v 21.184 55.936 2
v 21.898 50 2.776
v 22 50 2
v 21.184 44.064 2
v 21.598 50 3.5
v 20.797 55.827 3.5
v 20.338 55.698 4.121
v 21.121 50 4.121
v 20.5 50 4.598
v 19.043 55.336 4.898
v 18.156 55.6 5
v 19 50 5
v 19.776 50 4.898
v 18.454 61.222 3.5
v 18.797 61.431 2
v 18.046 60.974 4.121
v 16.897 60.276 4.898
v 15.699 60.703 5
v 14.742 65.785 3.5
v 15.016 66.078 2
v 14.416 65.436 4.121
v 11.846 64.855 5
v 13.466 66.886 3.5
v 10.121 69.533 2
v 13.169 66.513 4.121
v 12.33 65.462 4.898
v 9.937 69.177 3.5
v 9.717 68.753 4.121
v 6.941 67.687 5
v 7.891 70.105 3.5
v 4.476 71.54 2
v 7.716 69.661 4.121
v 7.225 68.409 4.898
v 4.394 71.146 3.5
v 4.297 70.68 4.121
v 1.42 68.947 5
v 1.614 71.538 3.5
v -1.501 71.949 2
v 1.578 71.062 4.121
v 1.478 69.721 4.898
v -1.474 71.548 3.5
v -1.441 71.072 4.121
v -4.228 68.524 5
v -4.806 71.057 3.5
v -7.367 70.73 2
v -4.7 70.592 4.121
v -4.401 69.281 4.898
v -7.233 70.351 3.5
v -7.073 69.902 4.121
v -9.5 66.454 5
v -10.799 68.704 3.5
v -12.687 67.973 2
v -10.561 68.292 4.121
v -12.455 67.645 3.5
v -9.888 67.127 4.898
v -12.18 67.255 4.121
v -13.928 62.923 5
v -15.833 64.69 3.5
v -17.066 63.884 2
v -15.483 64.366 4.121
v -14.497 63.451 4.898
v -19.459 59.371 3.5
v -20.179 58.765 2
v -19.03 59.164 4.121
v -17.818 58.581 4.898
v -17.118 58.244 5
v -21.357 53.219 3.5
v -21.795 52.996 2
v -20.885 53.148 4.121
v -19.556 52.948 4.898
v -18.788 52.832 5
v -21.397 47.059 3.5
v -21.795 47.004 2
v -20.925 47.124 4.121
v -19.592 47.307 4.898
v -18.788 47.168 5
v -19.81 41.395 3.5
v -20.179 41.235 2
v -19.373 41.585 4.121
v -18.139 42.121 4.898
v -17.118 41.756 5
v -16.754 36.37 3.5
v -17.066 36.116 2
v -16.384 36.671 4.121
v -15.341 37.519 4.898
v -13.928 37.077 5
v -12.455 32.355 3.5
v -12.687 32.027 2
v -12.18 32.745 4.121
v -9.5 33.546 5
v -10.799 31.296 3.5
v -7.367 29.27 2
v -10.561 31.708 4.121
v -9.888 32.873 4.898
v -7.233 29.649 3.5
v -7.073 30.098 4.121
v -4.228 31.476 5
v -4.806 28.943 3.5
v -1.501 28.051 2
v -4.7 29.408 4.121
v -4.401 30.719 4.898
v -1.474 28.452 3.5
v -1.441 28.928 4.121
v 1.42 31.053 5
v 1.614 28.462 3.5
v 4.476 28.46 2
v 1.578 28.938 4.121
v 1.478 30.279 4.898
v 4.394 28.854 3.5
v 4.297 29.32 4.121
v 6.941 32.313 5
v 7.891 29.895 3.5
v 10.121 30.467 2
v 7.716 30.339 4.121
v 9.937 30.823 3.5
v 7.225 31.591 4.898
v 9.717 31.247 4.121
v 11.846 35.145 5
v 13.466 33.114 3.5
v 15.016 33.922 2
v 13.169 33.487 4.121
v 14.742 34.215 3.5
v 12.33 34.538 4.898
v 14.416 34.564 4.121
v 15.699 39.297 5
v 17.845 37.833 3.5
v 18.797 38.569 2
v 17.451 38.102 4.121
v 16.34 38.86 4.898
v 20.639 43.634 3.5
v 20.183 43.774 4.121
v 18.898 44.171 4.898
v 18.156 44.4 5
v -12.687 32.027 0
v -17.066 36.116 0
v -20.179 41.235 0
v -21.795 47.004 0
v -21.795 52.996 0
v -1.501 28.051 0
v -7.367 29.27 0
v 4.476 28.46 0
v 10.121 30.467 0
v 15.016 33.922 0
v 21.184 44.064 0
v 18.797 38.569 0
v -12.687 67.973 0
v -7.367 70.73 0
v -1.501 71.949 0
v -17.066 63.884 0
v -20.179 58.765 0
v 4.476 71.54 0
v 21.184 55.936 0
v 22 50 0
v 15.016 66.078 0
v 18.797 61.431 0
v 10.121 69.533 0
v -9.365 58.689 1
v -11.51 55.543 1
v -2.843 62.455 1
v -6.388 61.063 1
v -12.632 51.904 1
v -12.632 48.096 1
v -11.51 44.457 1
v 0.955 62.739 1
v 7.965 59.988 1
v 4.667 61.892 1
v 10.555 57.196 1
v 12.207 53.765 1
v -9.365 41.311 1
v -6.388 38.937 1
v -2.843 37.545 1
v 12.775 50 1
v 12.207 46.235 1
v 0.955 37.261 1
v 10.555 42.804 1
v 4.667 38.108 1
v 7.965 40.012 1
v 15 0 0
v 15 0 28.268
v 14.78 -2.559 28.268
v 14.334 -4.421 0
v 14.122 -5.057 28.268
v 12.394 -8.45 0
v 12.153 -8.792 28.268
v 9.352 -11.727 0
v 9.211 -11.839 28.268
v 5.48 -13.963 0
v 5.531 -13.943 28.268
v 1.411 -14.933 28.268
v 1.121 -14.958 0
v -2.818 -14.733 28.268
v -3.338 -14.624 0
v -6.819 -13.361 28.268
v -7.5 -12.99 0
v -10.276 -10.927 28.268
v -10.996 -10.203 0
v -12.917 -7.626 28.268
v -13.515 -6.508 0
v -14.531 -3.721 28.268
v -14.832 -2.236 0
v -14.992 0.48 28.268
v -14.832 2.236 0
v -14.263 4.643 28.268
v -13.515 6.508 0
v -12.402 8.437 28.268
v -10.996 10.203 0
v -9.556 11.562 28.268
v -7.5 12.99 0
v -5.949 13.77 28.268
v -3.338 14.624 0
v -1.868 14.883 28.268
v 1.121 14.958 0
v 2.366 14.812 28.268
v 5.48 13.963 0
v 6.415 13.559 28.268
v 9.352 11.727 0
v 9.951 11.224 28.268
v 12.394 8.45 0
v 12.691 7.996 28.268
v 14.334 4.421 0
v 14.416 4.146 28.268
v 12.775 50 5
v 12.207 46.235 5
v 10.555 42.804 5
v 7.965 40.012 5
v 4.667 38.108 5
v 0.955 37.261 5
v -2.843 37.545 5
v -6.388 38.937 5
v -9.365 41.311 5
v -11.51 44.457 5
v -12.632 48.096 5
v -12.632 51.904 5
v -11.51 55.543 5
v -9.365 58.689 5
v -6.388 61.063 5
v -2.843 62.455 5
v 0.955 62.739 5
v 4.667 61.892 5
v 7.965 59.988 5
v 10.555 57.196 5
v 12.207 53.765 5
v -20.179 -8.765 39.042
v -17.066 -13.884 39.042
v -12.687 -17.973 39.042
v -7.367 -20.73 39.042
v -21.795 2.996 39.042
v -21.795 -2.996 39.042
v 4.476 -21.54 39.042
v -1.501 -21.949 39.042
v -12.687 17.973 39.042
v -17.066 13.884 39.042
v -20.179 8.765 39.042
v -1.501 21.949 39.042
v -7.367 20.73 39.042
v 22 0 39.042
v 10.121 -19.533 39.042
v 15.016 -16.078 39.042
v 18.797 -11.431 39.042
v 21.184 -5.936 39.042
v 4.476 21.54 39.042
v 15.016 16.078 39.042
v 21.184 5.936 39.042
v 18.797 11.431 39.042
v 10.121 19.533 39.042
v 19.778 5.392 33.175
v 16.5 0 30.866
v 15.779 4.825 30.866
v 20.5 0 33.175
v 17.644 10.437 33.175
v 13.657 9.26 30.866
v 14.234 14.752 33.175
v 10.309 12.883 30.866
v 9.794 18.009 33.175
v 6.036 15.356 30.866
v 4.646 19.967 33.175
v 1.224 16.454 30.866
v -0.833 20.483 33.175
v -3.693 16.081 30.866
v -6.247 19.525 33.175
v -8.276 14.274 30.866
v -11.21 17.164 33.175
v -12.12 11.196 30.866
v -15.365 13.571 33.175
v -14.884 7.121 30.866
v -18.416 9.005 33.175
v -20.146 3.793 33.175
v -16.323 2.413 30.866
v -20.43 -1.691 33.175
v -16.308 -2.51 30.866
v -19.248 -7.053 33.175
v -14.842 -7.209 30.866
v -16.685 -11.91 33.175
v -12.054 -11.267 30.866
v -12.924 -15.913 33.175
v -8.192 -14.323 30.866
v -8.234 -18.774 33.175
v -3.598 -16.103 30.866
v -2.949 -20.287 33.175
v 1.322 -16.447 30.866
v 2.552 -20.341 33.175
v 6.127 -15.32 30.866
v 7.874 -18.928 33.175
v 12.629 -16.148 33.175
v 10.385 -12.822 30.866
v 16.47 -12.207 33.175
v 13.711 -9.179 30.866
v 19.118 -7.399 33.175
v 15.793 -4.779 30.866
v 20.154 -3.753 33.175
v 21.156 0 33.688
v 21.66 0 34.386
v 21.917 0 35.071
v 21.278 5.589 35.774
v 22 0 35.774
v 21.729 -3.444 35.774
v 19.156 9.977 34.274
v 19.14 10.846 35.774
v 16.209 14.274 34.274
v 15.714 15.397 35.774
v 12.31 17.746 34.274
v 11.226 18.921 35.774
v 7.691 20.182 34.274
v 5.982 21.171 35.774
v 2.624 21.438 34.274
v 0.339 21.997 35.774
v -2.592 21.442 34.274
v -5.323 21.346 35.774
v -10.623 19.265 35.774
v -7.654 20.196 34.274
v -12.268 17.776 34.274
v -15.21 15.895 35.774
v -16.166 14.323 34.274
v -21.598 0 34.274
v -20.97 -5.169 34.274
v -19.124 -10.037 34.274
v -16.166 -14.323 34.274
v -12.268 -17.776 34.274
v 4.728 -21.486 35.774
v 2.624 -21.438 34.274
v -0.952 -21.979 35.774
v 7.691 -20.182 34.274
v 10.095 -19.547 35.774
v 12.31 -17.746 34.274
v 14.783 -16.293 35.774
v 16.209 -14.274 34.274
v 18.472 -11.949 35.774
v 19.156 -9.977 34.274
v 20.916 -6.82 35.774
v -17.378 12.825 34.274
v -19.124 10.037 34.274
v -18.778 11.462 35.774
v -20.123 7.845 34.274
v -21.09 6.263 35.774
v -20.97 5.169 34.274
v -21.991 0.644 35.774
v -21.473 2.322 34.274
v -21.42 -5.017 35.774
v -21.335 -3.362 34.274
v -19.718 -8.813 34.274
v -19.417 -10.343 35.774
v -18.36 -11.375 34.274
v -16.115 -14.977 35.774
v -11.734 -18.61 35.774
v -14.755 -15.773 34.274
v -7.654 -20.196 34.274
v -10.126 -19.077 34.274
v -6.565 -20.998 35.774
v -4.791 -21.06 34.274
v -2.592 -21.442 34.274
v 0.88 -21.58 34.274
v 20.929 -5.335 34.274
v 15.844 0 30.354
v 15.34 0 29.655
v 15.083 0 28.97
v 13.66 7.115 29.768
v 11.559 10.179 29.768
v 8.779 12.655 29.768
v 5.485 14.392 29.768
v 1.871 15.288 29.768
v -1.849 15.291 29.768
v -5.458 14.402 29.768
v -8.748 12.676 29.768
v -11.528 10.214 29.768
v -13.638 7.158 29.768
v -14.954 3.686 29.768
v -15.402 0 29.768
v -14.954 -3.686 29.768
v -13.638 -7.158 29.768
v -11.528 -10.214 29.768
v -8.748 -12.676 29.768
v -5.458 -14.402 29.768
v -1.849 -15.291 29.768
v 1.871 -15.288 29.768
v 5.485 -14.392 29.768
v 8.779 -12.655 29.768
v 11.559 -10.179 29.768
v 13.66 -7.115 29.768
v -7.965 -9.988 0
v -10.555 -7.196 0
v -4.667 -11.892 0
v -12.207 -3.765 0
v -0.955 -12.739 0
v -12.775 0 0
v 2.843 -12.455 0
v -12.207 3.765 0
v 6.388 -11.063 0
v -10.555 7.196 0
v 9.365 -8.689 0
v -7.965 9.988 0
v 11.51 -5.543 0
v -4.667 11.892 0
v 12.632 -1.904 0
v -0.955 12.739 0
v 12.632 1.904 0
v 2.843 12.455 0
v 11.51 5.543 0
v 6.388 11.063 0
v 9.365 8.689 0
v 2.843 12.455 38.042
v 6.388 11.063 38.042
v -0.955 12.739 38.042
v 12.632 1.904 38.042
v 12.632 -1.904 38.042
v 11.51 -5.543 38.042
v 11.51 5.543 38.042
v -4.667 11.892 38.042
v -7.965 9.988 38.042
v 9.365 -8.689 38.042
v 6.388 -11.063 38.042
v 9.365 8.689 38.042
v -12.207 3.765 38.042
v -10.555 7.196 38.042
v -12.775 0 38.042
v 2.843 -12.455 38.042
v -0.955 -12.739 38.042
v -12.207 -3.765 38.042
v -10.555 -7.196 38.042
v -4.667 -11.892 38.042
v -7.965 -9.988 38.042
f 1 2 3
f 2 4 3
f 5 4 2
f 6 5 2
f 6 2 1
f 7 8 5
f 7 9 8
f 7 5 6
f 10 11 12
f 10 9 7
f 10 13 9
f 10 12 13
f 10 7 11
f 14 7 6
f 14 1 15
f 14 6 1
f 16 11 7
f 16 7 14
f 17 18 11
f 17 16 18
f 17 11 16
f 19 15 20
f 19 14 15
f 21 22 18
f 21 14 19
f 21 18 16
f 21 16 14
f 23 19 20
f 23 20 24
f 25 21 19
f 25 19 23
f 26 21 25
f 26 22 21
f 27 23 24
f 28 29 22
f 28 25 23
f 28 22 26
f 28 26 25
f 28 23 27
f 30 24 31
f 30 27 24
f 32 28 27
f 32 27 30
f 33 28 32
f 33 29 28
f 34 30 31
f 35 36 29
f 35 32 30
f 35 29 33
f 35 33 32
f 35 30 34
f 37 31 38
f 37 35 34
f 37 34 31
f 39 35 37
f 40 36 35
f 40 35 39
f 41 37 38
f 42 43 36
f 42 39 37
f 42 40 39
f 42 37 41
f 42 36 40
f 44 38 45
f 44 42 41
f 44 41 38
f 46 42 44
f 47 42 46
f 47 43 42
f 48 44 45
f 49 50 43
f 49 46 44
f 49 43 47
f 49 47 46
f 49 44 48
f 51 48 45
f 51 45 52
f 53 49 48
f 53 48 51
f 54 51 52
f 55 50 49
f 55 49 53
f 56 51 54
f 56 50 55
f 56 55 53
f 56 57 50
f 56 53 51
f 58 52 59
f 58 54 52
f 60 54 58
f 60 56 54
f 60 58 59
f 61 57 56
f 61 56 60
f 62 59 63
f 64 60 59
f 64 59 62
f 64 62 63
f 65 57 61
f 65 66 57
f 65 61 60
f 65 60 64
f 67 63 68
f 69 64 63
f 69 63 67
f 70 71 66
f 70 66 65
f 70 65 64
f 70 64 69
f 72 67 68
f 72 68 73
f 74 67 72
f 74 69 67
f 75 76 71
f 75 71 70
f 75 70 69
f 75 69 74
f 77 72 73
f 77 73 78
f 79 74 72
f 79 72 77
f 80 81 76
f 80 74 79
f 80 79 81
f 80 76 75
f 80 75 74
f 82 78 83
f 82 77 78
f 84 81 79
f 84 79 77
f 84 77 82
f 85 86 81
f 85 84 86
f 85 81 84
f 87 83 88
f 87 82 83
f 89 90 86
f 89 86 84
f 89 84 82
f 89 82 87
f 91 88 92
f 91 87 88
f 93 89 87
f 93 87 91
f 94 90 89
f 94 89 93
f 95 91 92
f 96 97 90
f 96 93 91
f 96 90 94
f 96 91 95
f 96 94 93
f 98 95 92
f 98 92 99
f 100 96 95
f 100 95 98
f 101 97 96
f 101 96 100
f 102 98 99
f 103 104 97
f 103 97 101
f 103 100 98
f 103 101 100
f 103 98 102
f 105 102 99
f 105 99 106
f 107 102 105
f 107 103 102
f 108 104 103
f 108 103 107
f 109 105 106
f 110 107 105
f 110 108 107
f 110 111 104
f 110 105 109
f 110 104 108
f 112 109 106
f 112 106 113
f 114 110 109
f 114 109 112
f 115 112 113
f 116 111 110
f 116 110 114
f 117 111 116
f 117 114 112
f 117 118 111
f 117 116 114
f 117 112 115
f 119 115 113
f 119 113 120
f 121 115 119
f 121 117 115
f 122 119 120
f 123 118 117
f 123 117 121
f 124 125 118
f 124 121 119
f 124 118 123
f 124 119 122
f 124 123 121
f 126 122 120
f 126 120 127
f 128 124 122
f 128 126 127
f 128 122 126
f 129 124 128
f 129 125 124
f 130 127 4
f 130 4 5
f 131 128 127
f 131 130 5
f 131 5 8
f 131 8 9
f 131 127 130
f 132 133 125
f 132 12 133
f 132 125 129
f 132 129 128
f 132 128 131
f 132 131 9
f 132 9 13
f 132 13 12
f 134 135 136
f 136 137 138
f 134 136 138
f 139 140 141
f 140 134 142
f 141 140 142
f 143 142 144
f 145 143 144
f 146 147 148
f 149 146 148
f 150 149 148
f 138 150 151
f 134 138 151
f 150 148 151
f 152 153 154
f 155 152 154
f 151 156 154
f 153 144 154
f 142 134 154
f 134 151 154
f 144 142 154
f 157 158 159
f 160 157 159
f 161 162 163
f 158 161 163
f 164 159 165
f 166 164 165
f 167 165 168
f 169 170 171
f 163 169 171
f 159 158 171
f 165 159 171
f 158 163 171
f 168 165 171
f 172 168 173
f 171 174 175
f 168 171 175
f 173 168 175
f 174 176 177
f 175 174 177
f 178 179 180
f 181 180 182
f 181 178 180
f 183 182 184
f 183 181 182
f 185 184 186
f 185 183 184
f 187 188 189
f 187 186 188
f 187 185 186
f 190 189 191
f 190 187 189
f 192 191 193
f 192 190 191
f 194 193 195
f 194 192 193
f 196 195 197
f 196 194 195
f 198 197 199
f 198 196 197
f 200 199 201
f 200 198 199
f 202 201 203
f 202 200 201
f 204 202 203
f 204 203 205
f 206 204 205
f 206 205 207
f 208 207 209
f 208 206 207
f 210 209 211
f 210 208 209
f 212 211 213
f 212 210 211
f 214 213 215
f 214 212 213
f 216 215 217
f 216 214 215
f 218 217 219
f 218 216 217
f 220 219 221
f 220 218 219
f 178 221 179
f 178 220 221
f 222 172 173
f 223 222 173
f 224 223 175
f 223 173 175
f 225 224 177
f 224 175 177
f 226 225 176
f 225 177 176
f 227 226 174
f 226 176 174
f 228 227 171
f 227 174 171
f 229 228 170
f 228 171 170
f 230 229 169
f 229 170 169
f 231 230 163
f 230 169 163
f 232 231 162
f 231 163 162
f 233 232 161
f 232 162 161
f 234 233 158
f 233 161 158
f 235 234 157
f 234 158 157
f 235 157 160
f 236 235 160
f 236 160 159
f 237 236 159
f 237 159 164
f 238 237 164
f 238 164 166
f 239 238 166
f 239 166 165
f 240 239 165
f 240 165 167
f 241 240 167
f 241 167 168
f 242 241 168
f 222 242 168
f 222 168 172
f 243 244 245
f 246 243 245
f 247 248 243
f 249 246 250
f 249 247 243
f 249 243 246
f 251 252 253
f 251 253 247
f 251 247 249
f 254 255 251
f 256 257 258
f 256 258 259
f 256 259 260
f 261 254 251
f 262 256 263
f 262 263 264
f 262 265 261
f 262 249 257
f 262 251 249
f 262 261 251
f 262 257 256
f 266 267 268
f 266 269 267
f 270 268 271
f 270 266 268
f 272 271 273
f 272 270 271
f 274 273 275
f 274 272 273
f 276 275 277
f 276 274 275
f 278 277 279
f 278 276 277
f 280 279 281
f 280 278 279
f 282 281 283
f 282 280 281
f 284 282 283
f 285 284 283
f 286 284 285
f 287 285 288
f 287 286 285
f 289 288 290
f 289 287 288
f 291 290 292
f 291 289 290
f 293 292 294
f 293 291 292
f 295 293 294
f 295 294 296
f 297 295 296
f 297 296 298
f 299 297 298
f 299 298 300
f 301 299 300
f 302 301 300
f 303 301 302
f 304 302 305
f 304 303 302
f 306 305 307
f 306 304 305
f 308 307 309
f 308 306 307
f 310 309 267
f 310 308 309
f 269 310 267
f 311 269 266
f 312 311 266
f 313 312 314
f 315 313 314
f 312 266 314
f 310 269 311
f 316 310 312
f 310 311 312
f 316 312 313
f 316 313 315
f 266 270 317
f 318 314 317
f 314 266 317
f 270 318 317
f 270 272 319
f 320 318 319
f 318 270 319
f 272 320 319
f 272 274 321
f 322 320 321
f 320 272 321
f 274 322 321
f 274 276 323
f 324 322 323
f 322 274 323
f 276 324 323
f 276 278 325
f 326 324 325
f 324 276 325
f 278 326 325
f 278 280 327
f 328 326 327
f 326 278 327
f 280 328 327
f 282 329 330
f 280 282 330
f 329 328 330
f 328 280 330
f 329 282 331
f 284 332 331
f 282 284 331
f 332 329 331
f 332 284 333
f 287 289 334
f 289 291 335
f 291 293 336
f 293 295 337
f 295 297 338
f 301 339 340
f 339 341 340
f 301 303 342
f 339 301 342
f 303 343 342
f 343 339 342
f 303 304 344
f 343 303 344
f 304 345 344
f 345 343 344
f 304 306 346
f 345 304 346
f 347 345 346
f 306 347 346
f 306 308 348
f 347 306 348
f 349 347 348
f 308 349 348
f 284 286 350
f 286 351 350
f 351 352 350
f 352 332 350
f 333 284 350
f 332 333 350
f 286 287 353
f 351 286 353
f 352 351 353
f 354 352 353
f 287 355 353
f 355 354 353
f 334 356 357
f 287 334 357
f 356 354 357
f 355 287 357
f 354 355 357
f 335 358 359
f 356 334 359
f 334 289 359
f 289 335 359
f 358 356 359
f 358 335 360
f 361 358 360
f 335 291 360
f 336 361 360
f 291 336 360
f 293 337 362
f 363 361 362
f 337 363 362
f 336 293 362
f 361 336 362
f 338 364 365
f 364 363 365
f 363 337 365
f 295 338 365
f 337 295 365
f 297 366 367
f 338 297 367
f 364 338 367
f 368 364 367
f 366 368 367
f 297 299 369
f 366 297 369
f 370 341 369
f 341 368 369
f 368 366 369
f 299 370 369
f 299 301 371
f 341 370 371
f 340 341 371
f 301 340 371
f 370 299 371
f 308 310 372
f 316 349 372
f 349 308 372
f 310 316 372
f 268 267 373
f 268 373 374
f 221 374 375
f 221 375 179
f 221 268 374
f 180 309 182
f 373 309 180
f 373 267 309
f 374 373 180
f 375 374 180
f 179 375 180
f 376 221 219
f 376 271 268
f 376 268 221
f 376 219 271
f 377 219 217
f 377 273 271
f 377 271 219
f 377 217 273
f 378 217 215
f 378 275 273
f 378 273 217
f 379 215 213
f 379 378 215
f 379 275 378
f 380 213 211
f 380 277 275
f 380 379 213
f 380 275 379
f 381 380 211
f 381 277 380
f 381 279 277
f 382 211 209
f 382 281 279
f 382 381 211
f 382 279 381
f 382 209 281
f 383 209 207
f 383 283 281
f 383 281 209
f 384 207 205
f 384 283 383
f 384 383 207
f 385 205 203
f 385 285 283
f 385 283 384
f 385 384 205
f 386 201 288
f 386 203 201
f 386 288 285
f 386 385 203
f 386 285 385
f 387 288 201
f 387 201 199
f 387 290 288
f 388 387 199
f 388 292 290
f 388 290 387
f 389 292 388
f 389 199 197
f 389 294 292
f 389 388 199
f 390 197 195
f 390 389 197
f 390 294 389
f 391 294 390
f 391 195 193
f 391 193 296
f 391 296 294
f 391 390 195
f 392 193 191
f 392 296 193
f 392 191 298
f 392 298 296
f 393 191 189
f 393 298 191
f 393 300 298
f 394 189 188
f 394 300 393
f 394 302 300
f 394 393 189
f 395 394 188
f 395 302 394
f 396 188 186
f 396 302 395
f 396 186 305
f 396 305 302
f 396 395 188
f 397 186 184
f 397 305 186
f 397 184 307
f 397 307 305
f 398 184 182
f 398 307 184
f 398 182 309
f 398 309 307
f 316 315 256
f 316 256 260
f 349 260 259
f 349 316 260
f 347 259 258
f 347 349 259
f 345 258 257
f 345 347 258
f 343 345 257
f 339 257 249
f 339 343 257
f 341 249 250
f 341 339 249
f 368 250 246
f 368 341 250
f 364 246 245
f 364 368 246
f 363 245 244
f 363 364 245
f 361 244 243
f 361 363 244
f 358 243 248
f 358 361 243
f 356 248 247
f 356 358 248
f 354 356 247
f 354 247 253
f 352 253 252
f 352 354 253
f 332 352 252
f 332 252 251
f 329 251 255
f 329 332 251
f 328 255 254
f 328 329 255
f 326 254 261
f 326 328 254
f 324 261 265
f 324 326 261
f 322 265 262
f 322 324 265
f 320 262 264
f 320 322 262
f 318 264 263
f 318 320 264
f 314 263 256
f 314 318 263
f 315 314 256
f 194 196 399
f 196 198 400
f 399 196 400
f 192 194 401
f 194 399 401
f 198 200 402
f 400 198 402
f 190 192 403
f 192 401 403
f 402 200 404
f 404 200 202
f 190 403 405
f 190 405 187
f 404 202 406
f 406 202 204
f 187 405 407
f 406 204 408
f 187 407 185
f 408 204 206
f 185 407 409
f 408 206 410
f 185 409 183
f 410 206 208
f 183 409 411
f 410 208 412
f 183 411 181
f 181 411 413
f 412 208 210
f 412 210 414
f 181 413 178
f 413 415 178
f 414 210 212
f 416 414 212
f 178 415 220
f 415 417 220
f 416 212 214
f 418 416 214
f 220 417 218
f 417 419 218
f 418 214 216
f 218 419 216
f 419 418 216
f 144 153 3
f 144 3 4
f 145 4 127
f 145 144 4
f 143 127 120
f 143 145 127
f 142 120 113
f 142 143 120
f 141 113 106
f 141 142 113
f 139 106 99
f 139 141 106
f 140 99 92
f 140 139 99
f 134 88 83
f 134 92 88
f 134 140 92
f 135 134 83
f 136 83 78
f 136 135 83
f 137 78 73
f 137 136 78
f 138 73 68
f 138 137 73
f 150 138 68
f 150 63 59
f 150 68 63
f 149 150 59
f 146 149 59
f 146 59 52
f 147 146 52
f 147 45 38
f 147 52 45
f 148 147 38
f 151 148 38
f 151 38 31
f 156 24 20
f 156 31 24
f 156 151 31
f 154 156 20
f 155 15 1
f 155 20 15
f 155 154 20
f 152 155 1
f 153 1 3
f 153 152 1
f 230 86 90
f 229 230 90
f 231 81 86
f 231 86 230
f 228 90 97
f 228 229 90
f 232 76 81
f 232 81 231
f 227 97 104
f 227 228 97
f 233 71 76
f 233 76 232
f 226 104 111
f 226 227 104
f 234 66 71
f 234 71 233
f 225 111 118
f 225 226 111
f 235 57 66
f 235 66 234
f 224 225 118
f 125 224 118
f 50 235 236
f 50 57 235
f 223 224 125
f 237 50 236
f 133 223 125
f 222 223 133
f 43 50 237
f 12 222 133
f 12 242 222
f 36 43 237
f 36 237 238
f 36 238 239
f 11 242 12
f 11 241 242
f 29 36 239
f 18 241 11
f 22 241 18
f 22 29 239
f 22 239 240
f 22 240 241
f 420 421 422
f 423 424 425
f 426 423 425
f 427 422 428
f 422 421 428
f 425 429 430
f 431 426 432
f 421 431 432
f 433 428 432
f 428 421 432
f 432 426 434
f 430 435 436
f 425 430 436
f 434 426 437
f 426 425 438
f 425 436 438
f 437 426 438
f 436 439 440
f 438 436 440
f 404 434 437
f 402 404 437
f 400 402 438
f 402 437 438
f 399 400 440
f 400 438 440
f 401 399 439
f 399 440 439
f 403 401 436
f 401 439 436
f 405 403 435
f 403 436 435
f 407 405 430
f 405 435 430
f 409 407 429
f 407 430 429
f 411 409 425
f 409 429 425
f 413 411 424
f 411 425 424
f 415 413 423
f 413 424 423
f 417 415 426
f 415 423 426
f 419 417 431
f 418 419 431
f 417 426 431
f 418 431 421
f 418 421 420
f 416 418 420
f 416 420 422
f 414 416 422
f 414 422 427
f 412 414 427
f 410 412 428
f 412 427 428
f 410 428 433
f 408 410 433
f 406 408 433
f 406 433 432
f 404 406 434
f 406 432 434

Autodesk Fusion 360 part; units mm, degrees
sketch "Sketch1" plane through (0, 0, 0) normal (0, 0, 1) x (1, 0, 0)
  circle A0 centre (0, 0) radius 15
  dimension "d10" = 30
extrude "Extrude1" add sketch "Sketch1" along normal blind 30 makes body 1
ref_plane "WorkPlane1" through (0, 0, 34.0415) normal (0, 0, 1) x (1, 0, 0)
sketch "Sketch2" plane through (0, 0, 34.0415) normal (0, 0, 1) x (1, 0, 0)
  circle A0 centre (0, 0) radius 22
  dimension "d16" = 44
extrude "Extrude2" add sketch "Sketch2" along normal blind 5 separate body makes body 2
loft "Loft1" add section 1 face at (3.6653, 3.4009, 30) section 2 face at (5.8152, -3.0625, 34.0415) on bodies 1 2 bodies 1 2
sketch "Sketch3" plane through (0, 0, 39.0415) normal (0, 0, 1) x (-1, 0, 0)
  circle A0 centre (0, 0) radius 22
  circle A1 centre (0, 0) radius 12.775
  dimension "d19" = 25.55
extrude "Extrude3" cut sketch "Sketch3" against normal up to surface (38.0415 mm away) from surface at -1 contours A1 bodies 1
sketch "Sketch5" plane through (0, 0, 0) normal (0, 0, 1) x (1, 0, 0)
  circle A0 centre (0, 50) radius 22
  dimension "d26" = 44
extrude "Extrude5" add sketch "Sketch5" along normal blind 5 separate body makes body 3
sketch "Sketch7" plane through (0, 0, 0) normal (0, 0, -1) x (1, 0, 0)
  circle A0 centre (0, -50) radius 22
  circle A1 centre (0, -50) radius 12.775
  dimension "d39" = 25.55
extrude "Extrude7" cut sketch "Sketch7" against normal blind 5 from surface at -1 contours A1 bodies 3
fillet "Fillet1" radius 3 1 edges at (-20.5112, -7.9555, 34.0415) on bodies 1
fillet "Fillet2" radius 3 1 edges at (-13.9849, -5.4242, 30) on bodies 1
fillet "Fillet3" radius 3 1 edges at (-20.5112, 42.0445, 5) on bodies 3
equation "DiameterBase = 30 mm"
equation "DiameterCoin = 44 mm"
equation "DiameterMagnet = 25.55 mm"
equation "HeightMagnet = 3.2 mm"
equation "HeightBase = 30 mm"
equation "HeightJigPlate = 5 mm"
equation "d10 = DiameterBase"
equation "d11 = HeightBase"
equation "AngleLoft = 30 deg"
equation "HeightOffset = abs(DiameterBase - DiameterCoin) / 2 * tan(AngleLoft)"
equation "d15 = HeightOffset"
equation "d16 = DiameterCoin"
equation "d17 = HeightJigPlate"
equation "d19 = DiameterMagnet"
equation "d26 = DiameterCoin"
equation "d27 = HeightJigPlate"
equation "FilletSize = 3 mm"
equation "d34 = FilletSize"
equation "d36 = FilletSize"
equation "d38 = FilletSize"
equation "d39 = DiameterMagnet"
equation "d41 = -HeightJigPlate"
